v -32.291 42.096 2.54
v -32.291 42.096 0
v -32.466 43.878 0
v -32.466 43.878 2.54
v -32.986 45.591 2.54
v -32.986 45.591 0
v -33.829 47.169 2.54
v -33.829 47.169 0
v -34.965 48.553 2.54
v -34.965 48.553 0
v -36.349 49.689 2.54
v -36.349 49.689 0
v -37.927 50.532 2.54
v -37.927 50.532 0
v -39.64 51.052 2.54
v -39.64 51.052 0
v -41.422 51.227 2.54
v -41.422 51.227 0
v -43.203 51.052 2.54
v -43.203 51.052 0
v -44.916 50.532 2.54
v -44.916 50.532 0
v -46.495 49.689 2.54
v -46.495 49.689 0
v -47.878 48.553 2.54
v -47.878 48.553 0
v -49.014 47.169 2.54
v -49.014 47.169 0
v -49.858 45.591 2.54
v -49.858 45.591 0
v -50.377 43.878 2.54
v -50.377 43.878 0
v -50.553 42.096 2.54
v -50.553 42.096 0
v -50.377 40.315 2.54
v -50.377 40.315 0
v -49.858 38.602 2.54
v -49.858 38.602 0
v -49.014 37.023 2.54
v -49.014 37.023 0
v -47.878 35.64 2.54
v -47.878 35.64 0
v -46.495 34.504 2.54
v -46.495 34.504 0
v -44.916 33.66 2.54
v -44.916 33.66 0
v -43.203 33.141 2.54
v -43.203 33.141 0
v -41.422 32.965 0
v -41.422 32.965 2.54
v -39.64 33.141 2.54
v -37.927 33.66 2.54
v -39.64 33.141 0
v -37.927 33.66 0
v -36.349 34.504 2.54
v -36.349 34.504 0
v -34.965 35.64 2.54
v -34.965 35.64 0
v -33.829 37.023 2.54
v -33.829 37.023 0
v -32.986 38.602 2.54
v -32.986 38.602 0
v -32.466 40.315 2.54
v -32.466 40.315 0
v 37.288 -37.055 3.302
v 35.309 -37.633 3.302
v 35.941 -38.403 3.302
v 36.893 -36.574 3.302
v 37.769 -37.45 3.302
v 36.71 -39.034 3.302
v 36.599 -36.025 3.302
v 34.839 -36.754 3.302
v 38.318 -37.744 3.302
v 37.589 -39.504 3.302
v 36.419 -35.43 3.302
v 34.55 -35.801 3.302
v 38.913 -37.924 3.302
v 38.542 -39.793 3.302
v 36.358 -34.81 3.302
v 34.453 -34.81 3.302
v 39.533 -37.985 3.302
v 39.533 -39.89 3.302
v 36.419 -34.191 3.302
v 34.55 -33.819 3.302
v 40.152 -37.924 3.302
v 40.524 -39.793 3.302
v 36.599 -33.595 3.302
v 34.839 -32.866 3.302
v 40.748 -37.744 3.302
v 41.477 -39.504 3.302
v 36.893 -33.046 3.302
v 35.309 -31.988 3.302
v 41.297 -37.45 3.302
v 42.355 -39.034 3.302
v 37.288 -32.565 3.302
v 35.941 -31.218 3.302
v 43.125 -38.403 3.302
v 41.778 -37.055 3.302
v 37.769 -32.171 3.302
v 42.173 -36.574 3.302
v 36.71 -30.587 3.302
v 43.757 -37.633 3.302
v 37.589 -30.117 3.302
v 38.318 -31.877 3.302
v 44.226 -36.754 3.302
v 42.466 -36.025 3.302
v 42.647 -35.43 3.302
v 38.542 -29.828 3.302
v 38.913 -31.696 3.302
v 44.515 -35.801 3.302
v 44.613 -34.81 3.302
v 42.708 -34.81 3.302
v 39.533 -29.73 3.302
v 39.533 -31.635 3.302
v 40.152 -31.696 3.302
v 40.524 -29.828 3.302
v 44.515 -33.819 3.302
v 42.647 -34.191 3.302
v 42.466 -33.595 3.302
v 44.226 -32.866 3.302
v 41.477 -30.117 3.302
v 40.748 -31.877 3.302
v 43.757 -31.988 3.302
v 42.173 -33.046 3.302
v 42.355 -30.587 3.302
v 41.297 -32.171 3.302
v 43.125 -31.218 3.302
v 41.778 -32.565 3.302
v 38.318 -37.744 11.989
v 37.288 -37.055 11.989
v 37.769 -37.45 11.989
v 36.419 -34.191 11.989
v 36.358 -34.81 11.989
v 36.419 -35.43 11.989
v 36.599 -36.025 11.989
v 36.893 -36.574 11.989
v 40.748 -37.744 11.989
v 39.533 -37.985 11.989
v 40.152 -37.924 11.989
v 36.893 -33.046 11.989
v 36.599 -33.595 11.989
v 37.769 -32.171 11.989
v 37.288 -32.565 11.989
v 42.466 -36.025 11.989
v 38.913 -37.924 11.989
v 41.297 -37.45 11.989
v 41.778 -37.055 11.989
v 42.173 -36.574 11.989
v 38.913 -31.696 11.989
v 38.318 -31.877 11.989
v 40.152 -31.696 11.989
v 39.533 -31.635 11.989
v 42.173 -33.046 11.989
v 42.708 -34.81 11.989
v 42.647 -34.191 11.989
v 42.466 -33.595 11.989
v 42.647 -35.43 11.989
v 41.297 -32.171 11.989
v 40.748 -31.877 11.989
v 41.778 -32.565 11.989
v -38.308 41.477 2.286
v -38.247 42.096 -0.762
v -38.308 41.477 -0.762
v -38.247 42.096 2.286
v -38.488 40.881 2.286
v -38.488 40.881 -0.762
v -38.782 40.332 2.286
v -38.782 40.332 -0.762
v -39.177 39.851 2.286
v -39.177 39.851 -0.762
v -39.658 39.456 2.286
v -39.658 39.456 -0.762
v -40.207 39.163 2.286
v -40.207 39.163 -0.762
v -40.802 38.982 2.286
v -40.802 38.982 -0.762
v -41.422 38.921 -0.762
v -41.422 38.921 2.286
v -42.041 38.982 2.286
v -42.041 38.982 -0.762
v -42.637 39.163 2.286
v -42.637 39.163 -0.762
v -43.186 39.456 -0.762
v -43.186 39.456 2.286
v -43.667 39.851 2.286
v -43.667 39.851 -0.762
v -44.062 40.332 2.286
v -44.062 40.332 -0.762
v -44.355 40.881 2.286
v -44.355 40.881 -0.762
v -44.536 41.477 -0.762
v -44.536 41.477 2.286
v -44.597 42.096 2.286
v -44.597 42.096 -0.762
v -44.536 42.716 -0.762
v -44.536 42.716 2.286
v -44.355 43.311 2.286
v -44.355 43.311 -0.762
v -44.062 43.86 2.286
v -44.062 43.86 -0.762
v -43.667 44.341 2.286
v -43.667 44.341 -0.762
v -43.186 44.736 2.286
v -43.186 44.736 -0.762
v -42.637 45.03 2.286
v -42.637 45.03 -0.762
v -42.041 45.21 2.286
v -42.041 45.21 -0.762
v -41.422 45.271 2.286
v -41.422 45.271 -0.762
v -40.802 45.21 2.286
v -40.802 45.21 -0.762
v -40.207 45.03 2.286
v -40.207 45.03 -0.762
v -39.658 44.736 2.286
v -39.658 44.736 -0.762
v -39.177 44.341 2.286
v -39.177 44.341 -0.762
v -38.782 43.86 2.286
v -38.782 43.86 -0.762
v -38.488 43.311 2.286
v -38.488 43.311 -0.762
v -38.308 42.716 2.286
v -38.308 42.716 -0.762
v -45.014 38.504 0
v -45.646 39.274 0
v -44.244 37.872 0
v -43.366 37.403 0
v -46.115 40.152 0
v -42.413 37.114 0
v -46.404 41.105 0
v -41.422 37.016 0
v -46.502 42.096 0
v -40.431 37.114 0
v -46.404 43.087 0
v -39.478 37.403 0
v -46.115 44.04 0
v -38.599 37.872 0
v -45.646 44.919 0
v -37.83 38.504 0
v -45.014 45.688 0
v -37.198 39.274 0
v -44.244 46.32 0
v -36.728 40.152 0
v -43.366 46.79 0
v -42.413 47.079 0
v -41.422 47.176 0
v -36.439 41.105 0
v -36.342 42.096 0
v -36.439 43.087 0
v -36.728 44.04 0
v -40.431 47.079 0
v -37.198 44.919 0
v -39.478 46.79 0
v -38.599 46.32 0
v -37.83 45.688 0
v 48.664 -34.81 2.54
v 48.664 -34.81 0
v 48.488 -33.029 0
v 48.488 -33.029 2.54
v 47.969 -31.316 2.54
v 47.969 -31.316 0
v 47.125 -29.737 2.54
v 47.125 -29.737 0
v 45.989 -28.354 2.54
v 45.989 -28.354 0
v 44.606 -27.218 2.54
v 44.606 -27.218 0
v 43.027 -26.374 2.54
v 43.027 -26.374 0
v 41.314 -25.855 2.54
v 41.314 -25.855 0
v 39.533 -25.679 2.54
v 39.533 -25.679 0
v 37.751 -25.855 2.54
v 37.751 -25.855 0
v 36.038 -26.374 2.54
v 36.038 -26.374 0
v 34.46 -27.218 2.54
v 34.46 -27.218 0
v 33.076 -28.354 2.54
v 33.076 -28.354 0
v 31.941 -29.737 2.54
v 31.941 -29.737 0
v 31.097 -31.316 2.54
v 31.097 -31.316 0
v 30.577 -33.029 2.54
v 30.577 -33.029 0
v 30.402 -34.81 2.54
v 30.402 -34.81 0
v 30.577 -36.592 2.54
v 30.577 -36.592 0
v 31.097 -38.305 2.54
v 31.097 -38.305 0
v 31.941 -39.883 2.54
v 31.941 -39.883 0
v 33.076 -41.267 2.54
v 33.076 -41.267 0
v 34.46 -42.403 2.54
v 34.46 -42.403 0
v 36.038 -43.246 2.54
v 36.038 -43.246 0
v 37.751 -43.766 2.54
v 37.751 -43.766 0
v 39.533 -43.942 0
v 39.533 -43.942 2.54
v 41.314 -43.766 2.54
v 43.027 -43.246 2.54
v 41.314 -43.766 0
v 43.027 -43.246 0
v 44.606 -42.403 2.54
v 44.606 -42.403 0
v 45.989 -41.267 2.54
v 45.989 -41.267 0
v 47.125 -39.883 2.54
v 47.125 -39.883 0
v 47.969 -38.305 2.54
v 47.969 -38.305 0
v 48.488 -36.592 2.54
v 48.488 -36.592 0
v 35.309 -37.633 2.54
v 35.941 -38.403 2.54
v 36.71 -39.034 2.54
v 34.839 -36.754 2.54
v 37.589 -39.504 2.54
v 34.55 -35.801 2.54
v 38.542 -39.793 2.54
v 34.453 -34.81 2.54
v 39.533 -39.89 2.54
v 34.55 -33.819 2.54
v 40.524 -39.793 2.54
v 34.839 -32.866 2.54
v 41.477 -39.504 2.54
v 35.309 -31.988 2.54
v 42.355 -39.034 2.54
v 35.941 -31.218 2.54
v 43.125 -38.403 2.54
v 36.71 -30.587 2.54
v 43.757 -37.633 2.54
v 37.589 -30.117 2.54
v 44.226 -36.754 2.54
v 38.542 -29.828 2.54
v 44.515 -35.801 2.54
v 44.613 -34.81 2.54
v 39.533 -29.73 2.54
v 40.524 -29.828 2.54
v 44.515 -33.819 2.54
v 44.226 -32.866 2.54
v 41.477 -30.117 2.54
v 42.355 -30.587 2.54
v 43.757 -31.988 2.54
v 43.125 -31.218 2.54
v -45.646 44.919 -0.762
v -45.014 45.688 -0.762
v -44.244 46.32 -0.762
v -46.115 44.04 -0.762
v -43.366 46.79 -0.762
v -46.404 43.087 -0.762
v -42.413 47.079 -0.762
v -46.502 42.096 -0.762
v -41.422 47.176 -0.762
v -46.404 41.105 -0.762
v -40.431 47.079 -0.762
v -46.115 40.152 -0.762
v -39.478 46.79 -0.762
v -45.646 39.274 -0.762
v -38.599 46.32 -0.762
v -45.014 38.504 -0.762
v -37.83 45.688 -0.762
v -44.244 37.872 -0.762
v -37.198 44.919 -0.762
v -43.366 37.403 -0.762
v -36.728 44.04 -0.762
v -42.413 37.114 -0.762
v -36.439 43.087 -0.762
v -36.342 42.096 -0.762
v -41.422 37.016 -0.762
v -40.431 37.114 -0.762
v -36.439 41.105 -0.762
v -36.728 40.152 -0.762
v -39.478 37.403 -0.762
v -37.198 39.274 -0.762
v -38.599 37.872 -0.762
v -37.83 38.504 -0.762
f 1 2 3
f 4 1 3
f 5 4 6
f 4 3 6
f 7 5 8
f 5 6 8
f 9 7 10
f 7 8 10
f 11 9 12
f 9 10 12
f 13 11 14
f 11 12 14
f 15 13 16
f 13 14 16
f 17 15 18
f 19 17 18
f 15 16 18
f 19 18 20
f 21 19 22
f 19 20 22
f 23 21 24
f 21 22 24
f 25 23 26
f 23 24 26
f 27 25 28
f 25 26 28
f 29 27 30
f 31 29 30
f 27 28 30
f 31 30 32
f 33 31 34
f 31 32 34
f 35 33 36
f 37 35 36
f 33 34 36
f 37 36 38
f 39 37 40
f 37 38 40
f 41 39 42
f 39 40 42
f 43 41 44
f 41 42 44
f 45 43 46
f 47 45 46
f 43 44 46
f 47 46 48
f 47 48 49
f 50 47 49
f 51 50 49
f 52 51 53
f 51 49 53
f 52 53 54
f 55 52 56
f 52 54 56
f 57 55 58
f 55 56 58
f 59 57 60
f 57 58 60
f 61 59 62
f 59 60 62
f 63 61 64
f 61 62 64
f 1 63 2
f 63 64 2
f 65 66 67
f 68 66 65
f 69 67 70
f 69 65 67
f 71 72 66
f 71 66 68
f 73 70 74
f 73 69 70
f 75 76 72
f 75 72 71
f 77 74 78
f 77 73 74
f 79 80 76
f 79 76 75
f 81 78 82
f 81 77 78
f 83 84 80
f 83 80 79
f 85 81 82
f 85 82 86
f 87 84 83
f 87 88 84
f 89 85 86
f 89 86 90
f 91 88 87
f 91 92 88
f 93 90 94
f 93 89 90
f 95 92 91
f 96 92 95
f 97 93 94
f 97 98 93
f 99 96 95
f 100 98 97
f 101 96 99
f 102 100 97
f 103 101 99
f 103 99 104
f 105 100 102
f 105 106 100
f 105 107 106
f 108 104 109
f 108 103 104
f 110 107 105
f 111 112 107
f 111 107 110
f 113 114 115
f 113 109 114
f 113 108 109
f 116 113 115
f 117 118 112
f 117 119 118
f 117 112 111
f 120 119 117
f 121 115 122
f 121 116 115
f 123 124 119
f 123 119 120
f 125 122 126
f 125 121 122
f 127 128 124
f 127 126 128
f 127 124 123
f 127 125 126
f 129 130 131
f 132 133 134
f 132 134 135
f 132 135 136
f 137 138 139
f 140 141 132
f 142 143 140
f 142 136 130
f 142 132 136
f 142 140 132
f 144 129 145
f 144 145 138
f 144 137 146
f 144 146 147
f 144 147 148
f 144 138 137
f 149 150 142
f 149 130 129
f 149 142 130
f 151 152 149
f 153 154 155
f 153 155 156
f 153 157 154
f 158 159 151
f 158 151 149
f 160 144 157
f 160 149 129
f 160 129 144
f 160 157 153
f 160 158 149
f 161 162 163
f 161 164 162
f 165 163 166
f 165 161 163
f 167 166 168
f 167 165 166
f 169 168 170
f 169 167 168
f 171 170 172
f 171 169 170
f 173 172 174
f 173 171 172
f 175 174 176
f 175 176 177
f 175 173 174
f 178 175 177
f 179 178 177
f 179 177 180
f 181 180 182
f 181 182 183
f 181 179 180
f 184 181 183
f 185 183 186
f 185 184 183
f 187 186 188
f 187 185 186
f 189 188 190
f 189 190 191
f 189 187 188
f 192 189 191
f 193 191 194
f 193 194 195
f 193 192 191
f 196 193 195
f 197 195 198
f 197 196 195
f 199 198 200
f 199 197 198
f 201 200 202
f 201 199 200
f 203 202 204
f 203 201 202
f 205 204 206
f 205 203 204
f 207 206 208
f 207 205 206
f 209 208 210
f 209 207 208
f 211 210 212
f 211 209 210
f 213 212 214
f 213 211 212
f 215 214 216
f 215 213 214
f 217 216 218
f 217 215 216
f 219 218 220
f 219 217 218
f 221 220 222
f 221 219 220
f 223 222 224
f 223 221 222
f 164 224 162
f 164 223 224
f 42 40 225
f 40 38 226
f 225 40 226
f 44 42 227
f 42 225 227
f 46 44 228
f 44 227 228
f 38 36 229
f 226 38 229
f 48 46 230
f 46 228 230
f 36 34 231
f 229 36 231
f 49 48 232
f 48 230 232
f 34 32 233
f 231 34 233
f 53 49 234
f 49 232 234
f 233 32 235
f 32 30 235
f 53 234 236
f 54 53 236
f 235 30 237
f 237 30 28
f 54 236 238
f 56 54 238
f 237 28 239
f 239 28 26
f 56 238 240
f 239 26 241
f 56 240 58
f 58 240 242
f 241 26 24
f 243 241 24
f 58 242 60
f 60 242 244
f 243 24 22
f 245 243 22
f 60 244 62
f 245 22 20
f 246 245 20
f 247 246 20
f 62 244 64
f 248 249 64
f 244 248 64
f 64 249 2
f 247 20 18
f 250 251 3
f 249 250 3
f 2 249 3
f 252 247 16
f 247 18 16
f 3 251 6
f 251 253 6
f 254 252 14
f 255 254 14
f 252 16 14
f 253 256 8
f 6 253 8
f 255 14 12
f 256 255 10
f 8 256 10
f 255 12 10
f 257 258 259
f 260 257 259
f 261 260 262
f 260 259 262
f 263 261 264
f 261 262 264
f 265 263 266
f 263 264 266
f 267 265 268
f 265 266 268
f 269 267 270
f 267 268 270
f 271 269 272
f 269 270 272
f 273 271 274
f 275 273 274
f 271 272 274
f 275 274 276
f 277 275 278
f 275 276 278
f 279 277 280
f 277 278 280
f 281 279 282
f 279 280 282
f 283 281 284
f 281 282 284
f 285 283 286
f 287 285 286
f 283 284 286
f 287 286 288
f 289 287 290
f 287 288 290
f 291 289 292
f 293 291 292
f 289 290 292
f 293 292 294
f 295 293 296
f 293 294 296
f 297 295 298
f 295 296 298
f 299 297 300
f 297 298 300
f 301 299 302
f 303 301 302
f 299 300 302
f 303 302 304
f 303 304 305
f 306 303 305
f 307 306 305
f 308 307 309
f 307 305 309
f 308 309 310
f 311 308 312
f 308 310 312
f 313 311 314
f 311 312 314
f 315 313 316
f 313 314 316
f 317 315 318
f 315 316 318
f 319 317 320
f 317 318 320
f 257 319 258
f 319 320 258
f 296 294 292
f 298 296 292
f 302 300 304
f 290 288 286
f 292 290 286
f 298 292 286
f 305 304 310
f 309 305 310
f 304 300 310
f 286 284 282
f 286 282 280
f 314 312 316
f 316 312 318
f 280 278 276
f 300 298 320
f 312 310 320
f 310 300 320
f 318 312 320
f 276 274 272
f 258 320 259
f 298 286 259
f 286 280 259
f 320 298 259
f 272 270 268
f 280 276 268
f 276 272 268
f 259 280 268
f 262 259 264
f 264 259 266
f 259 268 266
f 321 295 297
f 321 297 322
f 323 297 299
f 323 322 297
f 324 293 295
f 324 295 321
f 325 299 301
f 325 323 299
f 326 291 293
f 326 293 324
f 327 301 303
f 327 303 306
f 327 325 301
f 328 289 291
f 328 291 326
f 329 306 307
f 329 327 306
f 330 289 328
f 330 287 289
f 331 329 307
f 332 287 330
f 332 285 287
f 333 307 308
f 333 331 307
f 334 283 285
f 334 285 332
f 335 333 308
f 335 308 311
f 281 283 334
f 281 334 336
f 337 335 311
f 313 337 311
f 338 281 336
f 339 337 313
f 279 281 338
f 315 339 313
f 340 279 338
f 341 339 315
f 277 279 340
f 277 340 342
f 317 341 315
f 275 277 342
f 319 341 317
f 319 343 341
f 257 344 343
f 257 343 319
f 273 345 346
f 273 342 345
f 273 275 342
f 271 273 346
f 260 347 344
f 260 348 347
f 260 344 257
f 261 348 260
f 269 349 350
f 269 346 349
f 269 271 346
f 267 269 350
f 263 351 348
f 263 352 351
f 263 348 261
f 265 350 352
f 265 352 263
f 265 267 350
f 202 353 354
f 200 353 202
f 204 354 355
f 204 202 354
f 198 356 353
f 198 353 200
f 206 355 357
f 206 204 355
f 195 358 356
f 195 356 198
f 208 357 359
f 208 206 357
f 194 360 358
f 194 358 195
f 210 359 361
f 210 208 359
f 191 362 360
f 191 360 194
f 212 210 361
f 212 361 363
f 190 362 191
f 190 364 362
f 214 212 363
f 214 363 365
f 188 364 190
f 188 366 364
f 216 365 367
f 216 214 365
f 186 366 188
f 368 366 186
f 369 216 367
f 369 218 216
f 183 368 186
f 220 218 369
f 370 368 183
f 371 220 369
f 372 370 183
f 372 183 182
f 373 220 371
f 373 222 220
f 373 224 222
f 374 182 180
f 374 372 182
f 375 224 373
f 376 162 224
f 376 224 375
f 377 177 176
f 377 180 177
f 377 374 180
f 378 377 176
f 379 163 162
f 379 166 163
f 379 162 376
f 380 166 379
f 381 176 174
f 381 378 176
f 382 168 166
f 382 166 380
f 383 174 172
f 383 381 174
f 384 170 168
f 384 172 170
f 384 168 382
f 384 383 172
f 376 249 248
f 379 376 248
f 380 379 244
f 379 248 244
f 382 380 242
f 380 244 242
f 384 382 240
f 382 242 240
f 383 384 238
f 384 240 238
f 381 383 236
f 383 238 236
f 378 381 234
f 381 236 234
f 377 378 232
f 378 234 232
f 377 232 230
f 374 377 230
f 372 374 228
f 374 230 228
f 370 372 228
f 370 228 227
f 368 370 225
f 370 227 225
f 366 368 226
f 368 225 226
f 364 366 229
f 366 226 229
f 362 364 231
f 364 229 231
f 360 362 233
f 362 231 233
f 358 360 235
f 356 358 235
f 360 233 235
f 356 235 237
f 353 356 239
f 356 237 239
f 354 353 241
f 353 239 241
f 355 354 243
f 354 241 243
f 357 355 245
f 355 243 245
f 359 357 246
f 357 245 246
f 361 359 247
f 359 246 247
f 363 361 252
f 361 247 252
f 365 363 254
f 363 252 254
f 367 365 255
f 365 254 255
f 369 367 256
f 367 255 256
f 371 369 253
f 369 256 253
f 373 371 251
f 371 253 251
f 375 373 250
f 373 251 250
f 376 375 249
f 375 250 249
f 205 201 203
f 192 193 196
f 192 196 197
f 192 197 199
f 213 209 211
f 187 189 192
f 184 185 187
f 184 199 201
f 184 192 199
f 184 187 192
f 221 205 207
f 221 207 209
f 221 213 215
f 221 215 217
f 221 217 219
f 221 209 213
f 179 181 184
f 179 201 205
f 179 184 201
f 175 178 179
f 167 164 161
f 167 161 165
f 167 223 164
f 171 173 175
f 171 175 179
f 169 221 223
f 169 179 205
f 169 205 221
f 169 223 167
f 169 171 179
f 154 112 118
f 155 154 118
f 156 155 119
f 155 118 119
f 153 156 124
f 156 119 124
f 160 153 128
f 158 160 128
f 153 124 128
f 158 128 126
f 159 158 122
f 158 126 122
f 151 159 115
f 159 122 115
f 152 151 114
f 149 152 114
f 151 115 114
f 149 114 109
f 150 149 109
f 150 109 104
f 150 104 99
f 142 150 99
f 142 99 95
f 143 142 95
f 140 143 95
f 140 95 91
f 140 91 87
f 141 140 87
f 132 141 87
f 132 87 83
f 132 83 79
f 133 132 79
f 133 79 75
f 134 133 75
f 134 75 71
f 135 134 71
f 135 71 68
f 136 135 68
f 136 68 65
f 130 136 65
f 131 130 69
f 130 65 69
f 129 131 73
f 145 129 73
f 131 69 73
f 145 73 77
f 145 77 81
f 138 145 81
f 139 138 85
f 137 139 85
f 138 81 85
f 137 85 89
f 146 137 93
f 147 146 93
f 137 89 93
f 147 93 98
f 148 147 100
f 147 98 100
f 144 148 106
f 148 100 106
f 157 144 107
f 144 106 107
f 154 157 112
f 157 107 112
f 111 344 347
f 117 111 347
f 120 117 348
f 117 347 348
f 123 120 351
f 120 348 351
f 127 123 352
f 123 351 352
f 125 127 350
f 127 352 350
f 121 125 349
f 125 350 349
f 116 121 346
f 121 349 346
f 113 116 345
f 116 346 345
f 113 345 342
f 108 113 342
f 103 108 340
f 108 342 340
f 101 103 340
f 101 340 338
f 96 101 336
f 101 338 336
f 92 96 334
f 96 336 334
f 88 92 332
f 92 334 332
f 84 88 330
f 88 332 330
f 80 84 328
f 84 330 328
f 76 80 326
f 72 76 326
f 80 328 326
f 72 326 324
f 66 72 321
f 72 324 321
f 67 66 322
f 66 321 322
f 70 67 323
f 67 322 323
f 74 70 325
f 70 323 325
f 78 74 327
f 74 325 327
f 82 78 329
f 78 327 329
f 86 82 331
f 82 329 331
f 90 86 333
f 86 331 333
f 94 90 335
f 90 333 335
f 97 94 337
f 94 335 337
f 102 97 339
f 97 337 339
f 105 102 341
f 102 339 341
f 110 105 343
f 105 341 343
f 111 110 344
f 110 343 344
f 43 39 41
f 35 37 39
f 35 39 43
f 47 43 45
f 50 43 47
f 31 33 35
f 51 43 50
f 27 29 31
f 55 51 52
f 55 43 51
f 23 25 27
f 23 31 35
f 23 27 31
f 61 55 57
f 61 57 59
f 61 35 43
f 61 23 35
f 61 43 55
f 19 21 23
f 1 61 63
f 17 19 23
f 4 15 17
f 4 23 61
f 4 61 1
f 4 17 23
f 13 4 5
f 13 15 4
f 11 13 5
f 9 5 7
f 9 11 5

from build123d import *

# Parameters (mm, degrees)
F0_R      = 9.1310834052
F1_DEPTH  = 2.54
F2_R      = 9.1310823042
F3_DEPTH  = 2.54
F4_R      = 3.175
F5_DEPTH  = 9.4488
F6_R      = 3.175
F7_DEPTH  = 1.778
F8_R      = 3.175
F9_DEPTH  = 2.032
F10_R     = 3.175
F11_DEPTH = 2.286
F12_R     = 5.08
F12_R_2   = 3.175
F13_DEPTH = 0.762
F14_R     = 5.08
F14_R_2   = 3.175
F15_DEPTH = 0.762


with BuildPart() as f1:
    # F0 (on Top) → F1 (new body)
    with BuildSketch(Plane.XY):
        with Locations((-41.4217039943, 42.0963279903)):
            Circle(F0_R)
    extrude(amount=F1_DEPTH)

    # F6 (on face) → F7 (join)
    with BuildSketch(Plane(origin=(0, 0, 0), x_dir=(1, 0, 0), z_dir=(0, 0, -1))):
        with Locations((-41.4217039943, -42.0963279903)):
            Circle(F6_R)
    extrude(amount=-F7_DEPTH)

    # F8 (on face) → F9 (join)
    with BuildSketch(Plane(origin=(0, 0, 0), x_dir=(1, 0, 0), z_dir=(0, 0, -1))):
        with Locations((-41.4217039943, -42.0963279903)):
            Circle(F8_R)
    extrude(amount=-F9_DEPTH)

    # F10 (on face) → F11 (cut)
    with BuildSketch(Plane(origin=(0, 0, 0), x_dir=(1, 0, 0), z_dir=(0, 0, -1))):
        with Locations((-41.4217039943, -42.0963279903)):
            Circle(F10_R)
    extrude(amount=-F11_DEPTH, mode=Mode.SUBTRACT)

    # F12 (on face) → F13 (join)
    with BuildSketch(Plane(origin=(0, 0, 0), x_dir=(1, 0, 0), z_dir=(0, 0, -1))):
        with Locations((-41.4217039943, -42.0963279903)):
            Circle(F12_R)
        with Locations((-41.4217039943, -42.0963279903)):
            Circle(F12_R_2, mode=Mode.SUBTRACT)
    extrude(amount=F13_DEPTH)


with BuildPart() as f3:
    # F2 (on Top) → F3 (new body)
    with BuildSketch(Plane.XY):
        with Locations((39.5327694714, -34.8104201257)):
            Circle(F2_R)
    extrude(amount=F3_DEPTH)

    # F4 (on face) → F5 (join)
    with BuildSketch(Plane.XY.offset(2.54)):
        with Locations((39.5327694714, -34.8104201257)):
            Circle(F4_R)
    extrude(amount=F5_DEPTH)

    # F14 (on face) → F15 (join)
    with BuildSketch(Plane.XY.offset(2.54)):
        with Locations((39.5327694714, -34.8104201257)):
            Circle(F14_R)
        with Locations((39.5327694714, -34.8104201257)):
            Circle(F14_R_2, mode=Mode.SUBTRACT)
    extrude(amount=F15_DEPTH)


solid = Compound([f1.part, f3.part])
